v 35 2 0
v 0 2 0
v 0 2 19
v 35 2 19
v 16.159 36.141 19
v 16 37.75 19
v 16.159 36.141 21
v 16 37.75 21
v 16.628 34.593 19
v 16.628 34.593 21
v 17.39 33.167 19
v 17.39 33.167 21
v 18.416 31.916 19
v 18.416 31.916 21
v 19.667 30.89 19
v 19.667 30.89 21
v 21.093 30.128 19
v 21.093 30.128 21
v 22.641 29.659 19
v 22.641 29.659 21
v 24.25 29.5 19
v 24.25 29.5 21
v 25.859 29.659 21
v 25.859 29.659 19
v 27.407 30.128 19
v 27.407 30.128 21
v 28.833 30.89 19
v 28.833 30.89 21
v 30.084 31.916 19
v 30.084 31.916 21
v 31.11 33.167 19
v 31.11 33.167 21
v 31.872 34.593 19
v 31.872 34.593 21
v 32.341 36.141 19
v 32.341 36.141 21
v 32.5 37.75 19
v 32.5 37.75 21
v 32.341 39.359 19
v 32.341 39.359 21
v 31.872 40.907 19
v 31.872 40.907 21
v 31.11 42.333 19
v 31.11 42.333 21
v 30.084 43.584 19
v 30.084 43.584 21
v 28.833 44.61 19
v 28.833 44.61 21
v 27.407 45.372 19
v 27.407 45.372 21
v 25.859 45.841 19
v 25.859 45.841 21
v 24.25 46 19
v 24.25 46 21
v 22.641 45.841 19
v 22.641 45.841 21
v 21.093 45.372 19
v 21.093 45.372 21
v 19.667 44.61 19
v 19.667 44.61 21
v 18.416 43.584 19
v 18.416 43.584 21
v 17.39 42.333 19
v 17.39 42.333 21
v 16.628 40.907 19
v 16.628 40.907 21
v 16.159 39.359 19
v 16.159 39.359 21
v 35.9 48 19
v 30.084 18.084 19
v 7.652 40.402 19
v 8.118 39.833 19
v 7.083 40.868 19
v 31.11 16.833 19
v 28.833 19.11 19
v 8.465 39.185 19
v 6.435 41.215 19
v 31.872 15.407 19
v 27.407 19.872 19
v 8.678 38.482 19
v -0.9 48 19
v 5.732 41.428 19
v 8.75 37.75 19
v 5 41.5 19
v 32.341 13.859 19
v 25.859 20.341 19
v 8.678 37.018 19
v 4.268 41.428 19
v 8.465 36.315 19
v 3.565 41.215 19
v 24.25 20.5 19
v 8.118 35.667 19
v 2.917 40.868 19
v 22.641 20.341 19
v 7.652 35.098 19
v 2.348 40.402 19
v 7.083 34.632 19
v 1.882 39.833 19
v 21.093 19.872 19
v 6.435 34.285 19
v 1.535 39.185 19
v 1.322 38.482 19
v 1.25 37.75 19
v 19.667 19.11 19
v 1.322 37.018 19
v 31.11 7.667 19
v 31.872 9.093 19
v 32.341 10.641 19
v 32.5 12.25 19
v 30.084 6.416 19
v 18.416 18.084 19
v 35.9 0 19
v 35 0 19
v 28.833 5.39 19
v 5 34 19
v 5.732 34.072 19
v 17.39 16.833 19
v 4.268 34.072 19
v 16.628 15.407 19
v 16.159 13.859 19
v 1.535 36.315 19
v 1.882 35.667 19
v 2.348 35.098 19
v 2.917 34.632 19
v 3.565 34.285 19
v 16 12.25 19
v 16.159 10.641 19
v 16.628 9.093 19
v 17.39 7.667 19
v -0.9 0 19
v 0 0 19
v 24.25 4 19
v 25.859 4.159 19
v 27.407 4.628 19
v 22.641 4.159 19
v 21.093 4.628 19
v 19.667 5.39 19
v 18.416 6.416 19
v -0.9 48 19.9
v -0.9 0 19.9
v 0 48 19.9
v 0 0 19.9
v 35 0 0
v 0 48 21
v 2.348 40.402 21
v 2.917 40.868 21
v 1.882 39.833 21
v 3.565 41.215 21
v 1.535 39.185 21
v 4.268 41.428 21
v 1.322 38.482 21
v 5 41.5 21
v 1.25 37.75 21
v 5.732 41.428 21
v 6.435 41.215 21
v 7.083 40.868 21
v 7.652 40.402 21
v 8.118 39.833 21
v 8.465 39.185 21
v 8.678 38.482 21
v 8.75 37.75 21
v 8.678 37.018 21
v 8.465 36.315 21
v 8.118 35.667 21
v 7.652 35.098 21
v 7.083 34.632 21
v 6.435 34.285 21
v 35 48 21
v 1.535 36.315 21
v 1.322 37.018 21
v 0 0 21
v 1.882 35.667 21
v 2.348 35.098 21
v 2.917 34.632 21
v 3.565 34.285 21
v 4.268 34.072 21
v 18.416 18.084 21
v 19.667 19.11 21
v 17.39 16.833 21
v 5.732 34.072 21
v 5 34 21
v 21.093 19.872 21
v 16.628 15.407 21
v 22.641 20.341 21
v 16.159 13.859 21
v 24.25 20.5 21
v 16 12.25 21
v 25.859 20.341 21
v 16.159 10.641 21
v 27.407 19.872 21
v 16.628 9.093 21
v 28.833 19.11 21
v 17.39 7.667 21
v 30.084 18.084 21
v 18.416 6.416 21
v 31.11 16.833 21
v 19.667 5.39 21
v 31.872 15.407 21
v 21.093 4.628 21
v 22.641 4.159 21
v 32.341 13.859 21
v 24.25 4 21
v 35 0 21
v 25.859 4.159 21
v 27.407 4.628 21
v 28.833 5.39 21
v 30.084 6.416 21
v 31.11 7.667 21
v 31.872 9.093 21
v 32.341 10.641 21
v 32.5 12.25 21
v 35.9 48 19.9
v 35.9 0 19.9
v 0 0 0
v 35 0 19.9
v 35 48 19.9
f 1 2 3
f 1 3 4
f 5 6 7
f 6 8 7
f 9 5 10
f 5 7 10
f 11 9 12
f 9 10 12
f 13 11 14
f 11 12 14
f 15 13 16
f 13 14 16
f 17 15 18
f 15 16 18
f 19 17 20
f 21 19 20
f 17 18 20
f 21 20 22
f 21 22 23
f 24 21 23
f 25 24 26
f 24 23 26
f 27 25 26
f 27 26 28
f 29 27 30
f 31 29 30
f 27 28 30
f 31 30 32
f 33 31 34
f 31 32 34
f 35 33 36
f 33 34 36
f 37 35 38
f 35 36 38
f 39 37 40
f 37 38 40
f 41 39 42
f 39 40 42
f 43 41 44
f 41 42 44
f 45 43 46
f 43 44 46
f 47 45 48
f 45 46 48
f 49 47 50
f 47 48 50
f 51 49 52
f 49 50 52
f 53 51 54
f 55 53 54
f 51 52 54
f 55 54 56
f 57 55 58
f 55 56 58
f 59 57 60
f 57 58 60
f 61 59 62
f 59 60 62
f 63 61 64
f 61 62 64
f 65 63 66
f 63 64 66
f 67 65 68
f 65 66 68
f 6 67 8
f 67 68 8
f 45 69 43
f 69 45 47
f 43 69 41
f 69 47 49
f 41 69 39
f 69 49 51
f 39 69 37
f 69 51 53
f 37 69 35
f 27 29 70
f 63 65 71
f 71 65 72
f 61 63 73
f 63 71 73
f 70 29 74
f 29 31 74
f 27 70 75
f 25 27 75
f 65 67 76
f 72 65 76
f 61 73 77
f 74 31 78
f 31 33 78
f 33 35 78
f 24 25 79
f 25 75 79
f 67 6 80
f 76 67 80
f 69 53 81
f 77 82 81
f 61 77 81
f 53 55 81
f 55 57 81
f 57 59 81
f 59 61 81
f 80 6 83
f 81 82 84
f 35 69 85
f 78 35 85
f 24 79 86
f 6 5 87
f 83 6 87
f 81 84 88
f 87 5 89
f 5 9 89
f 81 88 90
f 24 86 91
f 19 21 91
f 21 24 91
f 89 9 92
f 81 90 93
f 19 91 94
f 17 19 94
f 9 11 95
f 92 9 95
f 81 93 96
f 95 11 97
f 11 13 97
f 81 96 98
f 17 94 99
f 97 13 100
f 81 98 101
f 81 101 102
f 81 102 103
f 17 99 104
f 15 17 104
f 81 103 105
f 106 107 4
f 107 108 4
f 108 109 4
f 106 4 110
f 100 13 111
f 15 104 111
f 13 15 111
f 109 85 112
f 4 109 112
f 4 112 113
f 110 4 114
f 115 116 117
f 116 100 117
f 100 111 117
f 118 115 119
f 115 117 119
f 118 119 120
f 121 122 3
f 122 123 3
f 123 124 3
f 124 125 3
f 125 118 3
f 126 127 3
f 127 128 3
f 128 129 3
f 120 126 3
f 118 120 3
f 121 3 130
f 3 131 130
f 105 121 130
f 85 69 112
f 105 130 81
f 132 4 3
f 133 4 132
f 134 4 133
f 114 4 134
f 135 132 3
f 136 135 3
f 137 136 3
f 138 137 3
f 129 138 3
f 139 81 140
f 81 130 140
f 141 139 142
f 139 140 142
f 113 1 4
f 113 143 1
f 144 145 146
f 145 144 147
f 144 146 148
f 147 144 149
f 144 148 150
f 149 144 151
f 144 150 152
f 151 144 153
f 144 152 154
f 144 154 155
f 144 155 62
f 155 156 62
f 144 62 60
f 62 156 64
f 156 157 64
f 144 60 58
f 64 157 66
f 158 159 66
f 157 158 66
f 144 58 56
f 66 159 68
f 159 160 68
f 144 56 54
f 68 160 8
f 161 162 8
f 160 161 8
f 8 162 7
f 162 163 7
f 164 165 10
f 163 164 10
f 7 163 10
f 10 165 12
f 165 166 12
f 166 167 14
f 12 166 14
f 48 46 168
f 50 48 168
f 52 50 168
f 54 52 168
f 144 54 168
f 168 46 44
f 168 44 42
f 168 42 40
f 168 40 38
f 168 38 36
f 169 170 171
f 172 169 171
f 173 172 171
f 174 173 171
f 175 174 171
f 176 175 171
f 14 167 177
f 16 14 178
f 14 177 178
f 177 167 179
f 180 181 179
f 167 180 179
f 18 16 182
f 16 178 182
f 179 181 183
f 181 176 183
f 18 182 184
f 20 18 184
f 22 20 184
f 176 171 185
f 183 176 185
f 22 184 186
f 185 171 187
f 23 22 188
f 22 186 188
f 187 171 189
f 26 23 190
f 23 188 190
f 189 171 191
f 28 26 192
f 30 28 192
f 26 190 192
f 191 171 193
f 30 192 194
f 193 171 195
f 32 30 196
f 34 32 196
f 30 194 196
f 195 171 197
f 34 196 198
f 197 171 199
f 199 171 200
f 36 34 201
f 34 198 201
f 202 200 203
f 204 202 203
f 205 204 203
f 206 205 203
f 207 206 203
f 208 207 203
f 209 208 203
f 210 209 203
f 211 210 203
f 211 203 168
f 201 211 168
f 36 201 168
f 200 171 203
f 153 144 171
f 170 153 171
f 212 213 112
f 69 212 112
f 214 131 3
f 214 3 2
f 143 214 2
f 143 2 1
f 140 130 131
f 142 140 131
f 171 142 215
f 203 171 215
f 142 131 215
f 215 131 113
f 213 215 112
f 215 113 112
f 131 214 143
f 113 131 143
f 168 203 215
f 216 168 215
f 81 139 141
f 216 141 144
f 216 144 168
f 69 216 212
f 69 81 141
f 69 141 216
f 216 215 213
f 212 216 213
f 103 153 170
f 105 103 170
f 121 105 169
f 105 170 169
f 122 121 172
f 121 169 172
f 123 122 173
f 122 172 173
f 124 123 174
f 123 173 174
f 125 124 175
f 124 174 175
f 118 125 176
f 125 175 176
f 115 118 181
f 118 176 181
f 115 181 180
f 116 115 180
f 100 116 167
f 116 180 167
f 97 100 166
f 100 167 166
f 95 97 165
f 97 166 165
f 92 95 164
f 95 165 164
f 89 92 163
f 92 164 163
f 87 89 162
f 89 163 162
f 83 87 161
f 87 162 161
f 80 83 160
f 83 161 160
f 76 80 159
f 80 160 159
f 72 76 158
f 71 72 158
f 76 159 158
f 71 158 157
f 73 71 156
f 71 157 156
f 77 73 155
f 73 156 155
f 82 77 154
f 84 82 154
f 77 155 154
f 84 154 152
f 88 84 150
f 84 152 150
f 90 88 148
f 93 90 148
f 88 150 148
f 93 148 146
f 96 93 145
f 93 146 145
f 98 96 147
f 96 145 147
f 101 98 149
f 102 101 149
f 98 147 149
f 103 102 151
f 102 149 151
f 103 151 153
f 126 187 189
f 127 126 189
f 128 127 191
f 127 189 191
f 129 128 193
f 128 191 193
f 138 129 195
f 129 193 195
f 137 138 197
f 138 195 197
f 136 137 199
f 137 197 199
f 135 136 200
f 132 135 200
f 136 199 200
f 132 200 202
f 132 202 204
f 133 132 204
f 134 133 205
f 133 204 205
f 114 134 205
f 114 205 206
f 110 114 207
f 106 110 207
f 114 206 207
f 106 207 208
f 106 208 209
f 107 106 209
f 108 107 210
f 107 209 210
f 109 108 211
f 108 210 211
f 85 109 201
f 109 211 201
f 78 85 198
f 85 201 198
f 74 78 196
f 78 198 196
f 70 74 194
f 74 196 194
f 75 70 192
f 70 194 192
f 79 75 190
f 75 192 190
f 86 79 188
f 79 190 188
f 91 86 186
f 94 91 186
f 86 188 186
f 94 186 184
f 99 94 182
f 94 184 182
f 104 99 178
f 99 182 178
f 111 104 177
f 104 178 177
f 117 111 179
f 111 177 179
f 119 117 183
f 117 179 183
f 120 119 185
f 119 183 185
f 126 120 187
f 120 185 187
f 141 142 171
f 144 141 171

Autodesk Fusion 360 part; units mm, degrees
sketch "Sketch1" plane through (0, 0, 0) normal (0, 1, 0) x (1, 0, 0)
  line L0 (0, 0) -> (35, 0)
  line L1 (35, 0) -> (35, -19)
  line L2 (35, -19) -> (0, -19)
  line L3 (0, -19) -> (0, 0)
  line L4 (0, -19) -> (-0.9, -19)
  line L5 (-0.9, -19) -> (-0.9, -19.9)
  line L6 (-0.9, -19.9) -> (0, -19.9)
  line L7 (0, -19.9) -> (0, -21)
  line L8 (0, -21) -> (35, -21)
  line L9 (35, -21) -> (35, -19.9)
  line L10 (35, -19.9) -> (35.9, -19.9)
  line L11 (35.9, -19.9) -> (35.9, -19)
  line L12 (35.9, -19) -> (35, -19)
  dimension "d2" = 19
  dimension "d3" = 0.9
  dimension "d4" = 0.9
  dimension "d5" = 1.1
  dimension "d17" = 35
extrude "Extrude1" add sketch "Sketch1" along normal blind 48 contours L2 L4 L5 L6 L7 L8 L9 L10 L11 L12
extrude "Extrude2" add sketch "Sketch1" along normal blind 2 contours L0 L1 L2 L3
sketch "Sketch3" plane through (0, 0, 21) normal (0, 0, 1) x (-1, 0, 0)
  line L0 (0, 0) -> (-35, 0)
  line L1 (-35, 0) -> (-35, -48)
  line L2 (-35, -48) -> (0, -48)
  line L3 (0, -48) -> (0, 0)
  circle A0 centre (-24.25, -37.75) radius 8.25
  circle A1 centre (-24.25, -12.25) radius 8.25
  line L4 (-3, -46) -> (-36, -46) construction
  line L5 (-32.5, -48) -> (-32.5, 0) construction
  line L6 (-36, -4) -> (-3, -4) construction
  circle A2 centre (-5, -37.75) radius 3.75
  dimension "d10" = 16.5
  dimension "d11" = 2
  dimension "d12" = 2.5
  dimension "d13" = 42
  dimension "d14" = 7.5
  dimension "d15" = 5
extrude "Extrude3" cut sketch "Sketch3" against normal through all contours A0 | A1 | A2
